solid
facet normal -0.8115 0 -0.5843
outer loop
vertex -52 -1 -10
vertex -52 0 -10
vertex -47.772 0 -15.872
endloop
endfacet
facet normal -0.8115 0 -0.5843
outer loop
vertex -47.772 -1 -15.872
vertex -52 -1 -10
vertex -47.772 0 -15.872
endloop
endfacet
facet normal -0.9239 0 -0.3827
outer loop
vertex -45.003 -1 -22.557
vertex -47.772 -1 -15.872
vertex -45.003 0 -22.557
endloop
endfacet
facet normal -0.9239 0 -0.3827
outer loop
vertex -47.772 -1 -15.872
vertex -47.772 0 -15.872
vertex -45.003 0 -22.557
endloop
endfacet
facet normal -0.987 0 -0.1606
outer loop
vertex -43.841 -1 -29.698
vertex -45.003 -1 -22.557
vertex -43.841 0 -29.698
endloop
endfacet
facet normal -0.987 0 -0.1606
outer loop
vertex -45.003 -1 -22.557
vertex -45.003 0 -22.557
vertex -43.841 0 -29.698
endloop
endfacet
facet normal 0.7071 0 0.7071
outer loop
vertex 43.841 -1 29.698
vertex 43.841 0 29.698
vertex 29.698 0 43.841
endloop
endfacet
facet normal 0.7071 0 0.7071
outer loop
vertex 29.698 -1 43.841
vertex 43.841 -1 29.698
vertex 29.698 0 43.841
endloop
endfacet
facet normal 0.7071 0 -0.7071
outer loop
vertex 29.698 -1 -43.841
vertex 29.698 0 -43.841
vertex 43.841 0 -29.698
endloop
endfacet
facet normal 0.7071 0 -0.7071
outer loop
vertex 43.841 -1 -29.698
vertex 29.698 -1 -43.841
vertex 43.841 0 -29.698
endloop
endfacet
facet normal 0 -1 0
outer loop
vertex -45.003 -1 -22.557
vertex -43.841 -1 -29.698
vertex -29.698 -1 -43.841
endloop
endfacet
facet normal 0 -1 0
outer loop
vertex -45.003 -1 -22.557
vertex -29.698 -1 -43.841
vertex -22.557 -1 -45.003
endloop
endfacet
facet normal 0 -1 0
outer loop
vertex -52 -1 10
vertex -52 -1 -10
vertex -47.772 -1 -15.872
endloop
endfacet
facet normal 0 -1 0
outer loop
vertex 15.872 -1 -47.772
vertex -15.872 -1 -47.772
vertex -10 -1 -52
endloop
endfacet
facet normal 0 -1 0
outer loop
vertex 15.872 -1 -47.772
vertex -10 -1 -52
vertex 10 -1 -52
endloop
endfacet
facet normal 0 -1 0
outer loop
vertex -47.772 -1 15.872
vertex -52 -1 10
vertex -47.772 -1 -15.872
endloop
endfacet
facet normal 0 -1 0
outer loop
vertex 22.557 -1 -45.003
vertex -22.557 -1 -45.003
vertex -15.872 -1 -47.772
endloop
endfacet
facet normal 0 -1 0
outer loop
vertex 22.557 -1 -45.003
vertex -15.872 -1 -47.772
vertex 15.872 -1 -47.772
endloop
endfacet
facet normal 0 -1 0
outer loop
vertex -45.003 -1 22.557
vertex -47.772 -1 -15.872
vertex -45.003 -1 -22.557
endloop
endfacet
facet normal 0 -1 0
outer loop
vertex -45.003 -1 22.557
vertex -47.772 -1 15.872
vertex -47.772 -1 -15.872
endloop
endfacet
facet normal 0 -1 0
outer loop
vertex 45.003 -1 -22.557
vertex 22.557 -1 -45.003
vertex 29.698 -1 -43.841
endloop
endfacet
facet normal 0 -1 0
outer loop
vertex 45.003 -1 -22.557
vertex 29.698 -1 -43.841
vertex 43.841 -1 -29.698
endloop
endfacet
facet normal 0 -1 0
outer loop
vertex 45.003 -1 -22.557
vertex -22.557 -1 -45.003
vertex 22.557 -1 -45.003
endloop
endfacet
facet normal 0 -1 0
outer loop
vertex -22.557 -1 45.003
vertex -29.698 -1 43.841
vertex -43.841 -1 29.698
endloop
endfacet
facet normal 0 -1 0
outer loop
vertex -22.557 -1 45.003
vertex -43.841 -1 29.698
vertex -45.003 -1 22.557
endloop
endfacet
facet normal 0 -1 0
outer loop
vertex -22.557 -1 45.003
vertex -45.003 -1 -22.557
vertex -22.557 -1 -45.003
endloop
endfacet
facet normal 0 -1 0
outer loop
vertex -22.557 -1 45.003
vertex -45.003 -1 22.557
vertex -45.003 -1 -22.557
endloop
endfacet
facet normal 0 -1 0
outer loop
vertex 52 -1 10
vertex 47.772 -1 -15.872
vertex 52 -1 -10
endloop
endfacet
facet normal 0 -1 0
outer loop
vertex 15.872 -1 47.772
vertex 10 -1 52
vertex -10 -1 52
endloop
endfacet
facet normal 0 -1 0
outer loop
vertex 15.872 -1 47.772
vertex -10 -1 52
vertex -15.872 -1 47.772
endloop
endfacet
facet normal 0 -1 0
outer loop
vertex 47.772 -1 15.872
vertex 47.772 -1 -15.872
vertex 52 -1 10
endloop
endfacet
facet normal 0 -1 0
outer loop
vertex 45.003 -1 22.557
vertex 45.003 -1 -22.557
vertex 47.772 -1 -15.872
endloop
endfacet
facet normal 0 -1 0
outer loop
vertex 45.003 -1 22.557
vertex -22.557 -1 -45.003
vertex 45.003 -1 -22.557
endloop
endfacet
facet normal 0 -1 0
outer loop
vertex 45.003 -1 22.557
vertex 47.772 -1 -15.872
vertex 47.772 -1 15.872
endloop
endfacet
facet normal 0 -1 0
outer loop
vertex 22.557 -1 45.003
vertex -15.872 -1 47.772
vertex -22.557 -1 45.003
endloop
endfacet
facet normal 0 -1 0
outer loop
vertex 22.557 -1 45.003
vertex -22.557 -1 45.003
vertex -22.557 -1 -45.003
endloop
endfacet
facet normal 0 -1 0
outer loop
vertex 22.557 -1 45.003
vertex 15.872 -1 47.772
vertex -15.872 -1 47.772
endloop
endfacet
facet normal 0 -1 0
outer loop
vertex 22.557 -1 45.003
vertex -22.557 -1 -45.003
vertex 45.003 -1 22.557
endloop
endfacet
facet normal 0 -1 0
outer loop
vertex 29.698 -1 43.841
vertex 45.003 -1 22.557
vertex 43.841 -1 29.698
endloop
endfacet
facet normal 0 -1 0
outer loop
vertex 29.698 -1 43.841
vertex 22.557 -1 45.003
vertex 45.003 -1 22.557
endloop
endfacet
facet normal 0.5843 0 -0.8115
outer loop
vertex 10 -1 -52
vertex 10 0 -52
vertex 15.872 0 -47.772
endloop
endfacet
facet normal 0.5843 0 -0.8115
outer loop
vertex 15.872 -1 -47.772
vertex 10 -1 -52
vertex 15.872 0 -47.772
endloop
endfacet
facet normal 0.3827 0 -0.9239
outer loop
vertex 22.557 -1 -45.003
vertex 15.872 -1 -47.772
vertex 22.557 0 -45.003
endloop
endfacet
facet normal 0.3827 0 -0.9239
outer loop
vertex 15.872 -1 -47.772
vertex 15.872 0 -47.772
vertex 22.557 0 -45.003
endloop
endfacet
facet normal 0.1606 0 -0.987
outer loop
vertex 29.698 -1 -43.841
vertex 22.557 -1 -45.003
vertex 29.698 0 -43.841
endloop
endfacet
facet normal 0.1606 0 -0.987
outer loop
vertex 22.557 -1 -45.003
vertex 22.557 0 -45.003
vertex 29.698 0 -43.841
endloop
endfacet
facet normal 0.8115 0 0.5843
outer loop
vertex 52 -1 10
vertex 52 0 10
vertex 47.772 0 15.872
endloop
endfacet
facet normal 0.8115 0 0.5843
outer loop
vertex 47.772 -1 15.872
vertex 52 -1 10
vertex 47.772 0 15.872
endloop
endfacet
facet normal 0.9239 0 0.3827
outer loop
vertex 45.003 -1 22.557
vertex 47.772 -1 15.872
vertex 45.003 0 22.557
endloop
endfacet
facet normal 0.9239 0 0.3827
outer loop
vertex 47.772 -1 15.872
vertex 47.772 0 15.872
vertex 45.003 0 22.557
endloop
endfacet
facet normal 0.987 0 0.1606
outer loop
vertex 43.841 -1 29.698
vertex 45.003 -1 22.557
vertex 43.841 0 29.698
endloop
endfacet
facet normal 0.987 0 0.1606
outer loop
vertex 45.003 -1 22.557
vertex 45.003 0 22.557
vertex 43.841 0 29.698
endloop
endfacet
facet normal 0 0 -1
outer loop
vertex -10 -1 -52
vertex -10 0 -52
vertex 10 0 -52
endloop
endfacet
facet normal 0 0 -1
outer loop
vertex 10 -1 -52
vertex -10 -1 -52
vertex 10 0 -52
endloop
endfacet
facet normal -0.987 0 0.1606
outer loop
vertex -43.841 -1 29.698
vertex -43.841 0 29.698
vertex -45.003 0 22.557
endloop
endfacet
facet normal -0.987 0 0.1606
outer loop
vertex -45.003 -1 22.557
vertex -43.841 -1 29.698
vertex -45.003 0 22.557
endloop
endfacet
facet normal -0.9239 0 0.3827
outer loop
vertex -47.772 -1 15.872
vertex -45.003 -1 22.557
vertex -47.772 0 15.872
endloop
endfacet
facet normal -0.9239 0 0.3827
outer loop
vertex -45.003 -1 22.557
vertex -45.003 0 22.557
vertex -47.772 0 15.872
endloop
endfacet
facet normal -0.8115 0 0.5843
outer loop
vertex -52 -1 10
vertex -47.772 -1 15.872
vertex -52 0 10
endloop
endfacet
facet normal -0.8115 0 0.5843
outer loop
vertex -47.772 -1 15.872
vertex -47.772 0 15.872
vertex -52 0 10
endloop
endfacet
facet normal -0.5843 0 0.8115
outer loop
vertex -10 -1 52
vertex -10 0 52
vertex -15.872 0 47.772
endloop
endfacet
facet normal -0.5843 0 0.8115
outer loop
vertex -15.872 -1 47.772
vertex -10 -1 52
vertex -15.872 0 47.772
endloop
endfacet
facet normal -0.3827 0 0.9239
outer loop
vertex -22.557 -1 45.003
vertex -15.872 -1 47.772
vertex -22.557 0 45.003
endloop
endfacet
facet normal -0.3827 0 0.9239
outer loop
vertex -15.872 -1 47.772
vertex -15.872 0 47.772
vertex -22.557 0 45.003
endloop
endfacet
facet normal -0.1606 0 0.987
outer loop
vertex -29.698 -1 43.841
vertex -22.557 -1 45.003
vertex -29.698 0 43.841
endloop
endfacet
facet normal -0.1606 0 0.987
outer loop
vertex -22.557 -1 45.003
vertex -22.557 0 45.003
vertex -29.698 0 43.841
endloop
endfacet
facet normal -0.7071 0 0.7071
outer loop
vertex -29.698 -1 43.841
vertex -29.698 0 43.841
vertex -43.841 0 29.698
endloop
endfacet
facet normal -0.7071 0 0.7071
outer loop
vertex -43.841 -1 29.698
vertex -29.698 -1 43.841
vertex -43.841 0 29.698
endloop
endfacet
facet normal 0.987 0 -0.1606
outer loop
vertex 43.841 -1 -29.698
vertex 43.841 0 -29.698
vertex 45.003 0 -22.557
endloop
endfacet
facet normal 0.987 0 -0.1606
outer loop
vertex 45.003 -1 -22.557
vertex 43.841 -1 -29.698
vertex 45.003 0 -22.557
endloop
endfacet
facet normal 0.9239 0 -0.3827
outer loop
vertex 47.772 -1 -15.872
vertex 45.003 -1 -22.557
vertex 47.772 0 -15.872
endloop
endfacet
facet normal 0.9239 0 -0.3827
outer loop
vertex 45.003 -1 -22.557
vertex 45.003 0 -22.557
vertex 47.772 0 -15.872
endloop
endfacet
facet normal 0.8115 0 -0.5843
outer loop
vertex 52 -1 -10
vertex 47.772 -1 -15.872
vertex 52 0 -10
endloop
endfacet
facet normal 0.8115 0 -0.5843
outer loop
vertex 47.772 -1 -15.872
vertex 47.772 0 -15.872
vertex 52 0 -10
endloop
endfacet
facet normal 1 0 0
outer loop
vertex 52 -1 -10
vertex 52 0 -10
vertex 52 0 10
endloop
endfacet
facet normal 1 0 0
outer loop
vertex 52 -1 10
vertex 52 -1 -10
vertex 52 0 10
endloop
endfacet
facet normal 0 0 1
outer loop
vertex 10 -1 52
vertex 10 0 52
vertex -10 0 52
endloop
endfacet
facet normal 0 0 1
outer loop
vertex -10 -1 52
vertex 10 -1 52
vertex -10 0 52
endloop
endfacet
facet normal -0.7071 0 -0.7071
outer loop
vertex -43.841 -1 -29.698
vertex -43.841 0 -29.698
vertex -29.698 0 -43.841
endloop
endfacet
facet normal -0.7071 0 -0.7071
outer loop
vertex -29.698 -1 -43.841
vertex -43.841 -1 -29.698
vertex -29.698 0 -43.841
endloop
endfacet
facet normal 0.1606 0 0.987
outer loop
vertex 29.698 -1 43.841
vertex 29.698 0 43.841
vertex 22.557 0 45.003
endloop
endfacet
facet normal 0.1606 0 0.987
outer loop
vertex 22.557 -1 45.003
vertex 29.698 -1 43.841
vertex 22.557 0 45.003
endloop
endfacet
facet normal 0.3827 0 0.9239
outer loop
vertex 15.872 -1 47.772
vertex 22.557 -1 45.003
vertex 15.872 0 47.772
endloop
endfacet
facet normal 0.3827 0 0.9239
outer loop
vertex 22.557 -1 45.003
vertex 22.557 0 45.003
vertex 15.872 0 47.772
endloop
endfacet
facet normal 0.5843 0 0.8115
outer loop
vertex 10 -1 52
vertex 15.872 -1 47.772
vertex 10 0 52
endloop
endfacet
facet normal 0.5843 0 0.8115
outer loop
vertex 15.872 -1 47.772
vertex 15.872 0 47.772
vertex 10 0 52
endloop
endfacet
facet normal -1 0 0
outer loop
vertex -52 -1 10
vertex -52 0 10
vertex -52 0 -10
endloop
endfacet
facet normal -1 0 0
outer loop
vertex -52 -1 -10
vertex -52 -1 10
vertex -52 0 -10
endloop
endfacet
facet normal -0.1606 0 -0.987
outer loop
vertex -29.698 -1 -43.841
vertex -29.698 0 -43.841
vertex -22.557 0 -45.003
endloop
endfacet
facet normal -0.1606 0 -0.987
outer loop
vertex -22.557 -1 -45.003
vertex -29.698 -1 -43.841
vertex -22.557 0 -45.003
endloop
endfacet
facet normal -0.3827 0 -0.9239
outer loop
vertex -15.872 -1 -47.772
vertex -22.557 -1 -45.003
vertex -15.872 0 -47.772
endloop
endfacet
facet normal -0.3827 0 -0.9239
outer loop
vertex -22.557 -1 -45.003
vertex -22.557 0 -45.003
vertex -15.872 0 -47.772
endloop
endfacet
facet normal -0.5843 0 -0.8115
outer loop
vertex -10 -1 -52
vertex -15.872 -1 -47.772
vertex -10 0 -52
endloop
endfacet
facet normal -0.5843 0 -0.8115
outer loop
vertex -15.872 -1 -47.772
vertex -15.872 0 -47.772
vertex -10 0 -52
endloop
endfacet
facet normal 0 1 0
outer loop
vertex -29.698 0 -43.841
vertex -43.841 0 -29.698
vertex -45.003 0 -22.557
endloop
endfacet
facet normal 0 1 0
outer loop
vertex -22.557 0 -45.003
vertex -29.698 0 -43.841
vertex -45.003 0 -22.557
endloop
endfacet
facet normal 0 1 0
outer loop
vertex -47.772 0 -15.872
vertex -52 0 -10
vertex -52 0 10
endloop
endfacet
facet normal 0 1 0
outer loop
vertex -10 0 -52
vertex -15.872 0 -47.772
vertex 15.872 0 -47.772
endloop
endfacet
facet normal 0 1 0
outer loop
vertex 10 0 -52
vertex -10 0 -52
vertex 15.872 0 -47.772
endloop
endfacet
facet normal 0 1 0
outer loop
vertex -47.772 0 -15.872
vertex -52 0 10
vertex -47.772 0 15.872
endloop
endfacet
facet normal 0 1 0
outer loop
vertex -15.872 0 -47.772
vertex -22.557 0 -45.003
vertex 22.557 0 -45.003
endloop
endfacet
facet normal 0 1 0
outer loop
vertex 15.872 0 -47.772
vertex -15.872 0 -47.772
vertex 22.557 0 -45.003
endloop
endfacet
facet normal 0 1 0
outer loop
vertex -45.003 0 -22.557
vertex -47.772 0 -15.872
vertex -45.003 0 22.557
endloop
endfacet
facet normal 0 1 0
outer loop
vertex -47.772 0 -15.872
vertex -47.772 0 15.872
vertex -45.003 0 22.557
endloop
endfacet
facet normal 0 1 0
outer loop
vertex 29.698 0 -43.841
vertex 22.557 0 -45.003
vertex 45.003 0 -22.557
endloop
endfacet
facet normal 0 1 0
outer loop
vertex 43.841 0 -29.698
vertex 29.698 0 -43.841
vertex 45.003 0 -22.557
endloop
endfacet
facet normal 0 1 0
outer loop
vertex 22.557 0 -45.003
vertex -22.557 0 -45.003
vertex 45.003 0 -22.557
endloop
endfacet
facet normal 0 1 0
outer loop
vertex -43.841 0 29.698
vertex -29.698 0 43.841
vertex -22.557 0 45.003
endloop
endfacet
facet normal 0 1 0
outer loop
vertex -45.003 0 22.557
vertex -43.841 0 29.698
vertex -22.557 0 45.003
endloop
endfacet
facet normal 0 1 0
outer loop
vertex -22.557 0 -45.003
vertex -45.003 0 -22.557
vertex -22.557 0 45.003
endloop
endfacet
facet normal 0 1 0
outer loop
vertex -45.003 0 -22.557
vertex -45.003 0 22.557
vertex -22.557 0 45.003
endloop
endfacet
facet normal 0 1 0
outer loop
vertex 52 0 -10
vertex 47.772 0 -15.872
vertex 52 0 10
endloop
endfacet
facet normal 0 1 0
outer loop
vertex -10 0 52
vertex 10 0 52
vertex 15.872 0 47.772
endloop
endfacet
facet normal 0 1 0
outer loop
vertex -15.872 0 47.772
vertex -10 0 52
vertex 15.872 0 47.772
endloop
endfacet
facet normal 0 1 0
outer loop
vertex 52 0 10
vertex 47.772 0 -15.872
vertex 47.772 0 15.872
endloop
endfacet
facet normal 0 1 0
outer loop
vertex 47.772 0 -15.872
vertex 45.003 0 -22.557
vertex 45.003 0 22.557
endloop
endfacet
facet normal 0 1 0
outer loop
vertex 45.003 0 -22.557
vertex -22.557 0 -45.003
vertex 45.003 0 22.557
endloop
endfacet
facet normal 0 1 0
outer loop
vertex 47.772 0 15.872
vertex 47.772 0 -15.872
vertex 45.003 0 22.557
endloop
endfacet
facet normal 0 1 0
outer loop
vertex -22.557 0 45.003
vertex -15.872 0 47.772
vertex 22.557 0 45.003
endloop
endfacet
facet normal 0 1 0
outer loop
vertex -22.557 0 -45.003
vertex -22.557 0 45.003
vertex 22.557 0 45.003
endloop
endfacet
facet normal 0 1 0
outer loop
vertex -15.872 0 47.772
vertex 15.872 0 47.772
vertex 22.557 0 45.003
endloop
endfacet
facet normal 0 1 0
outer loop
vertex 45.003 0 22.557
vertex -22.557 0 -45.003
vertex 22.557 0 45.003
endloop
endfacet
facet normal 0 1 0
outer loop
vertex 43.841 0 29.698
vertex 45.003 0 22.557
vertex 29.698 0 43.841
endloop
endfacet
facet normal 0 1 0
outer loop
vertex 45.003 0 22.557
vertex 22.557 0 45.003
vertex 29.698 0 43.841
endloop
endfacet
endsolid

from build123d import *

# Parameters (mm, degrees)
F1_DEPTH = 1


with BuildPart() as f1:
    # F0 (on Front) → F1 (new body)
    with BuildSketch(Plane.XZ):
        with BuildLine():
            Line((10, 52), (-10, 52))
            ThreePointArc((-10, 52), (-19.134172, 46.193977), (-29.698485, 43.84062))
            Line((-29.698485, 43.84062), (-43.84062, 29.698485))
            ThreePointArc((-43.84062, 29.698485), (-46.193977, 19.134172), (-52, 10))
            Line((-52, 10), (-52, -10))
            ThreePointArc((-52, -10), (-46.193977, -19.134172), (-43.84062, -29.698485))
            Line((-43.84062, -29.698485), (-29.698485, -43.84062))
            ThreePointArc((-29.698485, -43.84062), (-19.134172, -46.193977), (-10, -52))
            Line((-10, -52), (10, -52))
            ThreePointArc((10, -52), (19.134172, -46.193977), (29.698485, -43.84062))
            Line((29.698485, -43.84062), (43.84062, -29.698485))
            ThreePointArc((43.84062, -29.698485), (46.193977, -19.134172), (52, -10))
            Line((52, -10), (52, 10))
            ThreePointArc((52, 10), (46.193977, 19.134172), (43.84062, 29.698485))
            Line((43.84062, 29.698485), (29.698485, 43.84062))
            ThreePointArc((29.698485, 43.84062), (19.134172, 46.193977), (10, 52))
        make_face()
    extrude(amount=F1_DEPTH)


solid = f1.part
